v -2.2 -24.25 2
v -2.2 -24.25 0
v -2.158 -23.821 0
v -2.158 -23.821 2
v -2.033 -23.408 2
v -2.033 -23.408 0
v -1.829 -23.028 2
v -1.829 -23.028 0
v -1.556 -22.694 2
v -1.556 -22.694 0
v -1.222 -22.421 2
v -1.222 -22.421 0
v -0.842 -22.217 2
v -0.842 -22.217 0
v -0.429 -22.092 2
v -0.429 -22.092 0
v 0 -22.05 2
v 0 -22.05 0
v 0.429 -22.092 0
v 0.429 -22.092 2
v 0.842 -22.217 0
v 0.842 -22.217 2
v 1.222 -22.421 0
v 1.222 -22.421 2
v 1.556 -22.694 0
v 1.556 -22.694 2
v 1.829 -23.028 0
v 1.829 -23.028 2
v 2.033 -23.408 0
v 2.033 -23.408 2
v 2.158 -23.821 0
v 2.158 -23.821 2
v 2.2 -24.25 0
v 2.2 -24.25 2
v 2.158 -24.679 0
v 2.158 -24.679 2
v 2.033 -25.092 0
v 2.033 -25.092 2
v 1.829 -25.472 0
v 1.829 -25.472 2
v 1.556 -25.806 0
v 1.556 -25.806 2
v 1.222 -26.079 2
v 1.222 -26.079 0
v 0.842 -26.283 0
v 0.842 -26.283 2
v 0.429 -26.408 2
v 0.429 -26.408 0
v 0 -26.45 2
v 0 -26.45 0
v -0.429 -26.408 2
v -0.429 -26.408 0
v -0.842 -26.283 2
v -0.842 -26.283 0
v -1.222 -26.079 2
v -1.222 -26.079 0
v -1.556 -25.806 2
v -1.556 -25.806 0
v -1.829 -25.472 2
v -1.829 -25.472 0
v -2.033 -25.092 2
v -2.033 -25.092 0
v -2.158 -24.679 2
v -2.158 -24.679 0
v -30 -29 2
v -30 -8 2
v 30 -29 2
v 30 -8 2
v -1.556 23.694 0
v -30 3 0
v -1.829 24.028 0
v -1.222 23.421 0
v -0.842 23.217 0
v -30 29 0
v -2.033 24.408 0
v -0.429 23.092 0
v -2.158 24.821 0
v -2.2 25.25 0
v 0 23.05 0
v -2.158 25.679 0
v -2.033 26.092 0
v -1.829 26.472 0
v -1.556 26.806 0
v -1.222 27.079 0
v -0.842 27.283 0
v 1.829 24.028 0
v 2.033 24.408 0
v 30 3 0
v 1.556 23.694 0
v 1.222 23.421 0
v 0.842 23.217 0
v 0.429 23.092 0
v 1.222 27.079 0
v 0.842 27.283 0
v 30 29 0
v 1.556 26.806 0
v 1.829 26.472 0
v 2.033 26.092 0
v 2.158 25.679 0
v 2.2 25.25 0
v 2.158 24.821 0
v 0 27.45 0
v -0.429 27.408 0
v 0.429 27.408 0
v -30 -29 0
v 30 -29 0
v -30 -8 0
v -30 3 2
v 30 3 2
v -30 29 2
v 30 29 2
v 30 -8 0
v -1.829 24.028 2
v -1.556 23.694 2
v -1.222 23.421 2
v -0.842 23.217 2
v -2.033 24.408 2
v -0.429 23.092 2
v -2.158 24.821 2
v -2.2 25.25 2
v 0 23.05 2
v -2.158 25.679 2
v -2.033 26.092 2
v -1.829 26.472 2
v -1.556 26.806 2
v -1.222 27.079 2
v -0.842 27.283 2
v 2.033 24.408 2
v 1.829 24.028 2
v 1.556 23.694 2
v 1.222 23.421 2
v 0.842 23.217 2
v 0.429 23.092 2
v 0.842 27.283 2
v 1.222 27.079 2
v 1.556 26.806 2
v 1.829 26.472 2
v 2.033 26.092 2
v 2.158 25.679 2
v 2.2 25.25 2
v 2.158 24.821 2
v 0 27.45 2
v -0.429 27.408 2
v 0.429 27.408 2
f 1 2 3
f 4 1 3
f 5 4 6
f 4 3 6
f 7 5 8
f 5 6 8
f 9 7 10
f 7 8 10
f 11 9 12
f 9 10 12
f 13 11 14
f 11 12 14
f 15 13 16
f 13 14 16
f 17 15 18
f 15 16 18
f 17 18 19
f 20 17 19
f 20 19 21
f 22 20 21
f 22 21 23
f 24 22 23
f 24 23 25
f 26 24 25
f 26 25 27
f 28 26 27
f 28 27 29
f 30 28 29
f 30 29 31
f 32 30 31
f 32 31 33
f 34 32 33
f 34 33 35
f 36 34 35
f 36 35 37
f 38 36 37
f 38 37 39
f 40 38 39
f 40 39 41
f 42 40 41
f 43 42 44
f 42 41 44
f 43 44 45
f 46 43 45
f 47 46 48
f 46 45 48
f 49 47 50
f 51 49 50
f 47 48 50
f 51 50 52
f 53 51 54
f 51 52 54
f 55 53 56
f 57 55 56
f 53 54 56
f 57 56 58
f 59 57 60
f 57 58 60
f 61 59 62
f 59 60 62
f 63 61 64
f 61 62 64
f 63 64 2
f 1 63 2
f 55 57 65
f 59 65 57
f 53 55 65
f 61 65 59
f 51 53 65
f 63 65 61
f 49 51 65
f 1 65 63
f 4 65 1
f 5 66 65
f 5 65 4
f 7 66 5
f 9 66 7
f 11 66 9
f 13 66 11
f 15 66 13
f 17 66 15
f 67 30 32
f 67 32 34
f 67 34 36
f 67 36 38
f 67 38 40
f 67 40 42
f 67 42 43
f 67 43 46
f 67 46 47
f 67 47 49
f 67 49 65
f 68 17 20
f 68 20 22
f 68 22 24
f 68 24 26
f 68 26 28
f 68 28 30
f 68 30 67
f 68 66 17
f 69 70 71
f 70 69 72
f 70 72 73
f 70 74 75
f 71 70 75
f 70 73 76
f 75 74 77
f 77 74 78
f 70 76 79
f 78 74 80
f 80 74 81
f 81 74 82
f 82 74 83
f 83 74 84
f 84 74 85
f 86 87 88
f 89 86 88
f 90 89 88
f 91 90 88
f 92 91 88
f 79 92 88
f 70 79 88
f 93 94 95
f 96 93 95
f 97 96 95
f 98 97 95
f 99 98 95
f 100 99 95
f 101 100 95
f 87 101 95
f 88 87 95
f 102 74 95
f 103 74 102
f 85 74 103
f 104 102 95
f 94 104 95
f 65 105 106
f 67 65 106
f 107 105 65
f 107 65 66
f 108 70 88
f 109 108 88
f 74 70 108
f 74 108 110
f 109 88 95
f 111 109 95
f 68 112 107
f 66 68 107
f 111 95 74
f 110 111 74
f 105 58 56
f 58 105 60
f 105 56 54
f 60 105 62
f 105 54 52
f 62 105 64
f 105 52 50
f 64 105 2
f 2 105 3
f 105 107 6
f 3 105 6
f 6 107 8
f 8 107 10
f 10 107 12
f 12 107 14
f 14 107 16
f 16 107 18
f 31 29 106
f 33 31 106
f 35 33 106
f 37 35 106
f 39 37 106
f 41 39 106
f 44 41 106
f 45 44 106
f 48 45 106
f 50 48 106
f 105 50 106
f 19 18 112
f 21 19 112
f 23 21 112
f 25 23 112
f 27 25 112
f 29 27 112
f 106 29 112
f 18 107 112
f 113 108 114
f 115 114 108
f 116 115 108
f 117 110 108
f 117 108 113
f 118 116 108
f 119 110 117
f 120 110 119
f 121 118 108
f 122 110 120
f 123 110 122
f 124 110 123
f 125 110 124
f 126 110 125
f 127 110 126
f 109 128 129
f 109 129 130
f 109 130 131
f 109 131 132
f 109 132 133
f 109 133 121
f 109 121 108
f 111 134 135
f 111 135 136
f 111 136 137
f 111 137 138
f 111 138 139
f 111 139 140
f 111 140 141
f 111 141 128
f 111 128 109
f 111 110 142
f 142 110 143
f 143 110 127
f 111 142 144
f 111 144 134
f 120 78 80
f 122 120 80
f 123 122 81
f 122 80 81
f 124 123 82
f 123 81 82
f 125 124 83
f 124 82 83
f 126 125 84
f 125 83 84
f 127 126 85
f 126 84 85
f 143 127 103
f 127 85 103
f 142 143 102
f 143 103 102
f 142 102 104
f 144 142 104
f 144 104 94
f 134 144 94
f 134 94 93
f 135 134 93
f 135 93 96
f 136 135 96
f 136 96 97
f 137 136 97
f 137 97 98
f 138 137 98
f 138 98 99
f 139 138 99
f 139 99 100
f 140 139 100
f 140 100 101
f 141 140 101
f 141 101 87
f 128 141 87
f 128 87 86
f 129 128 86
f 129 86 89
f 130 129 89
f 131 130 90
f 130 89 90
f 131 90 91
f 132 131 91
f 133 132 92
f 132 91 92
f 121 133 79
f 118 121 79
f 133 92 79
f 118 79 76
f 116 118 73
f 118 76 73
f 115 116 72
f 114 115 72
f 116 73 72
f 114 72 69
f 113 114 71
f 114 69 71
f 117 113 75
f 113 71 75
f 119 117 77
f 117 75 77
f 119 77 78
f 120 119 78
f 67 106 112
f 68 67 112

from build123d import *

# Parameters (mm, degrees)
F0_W             = 13.2466710359
F0_H             = 26
F0_W_2           = 16.7533289641
F0_W_3           = 30
F1_DEPTH         = 2
F0_W_4           = 13.0084685236
F0_H_2           = 21
F3_D             = 4.4
F3_CBORE_D       = 8.25
F3_CBORE_DEPTH   = 0
F3_2_D           = 4.4
F3_2_CBORE_D     = 8.25
F3_2_CBORE_DEPTH = 0


with BuildPart() as f1:
    # F0 (on Top) → F1 (new body)
    with BuildSketch(Plane.XY):
        with Locations((-23.3766644821, 16)):
            Rectangle(F0_W, F0_H)
        with Locations((-8.3766644821, 16)):
            Rectangle(F0_W_2, F0_H)
        with Locations((15, 16)):
            Rectangle(F0_W_3, F0_H)
    extrude(amount=F1_DEPTH)

    # F3 (through all)
    with Locations(Plane.XY.offset(2)):
        with Locations((0, 25.25), (0, -24.25)):
            CounterBoreHole(F3_D / 2, F3_CBORE_D / 2, F3_CBORE_DEPTH)


with BuildPart() as f1b:
    # F0 (on Top) → F1, piece 2 (new body)
    with BuildSketch(Plane.XY):
        Polygon((30, -8), (0, -8), (0, -20.5), (0, -29), (30, -29), align=None)
        with Locations((-23.4957657382, -18.5)):
            Rectangle(F0_W_4, F0_H_2)
        Polygon((0, -8), (-16.9915314764, -8), (-16.9915314764, -29), (0, -29), (0, -20.5), align=None)
    extrude(amount=F1_DEPTH)

    # F3#2 (through all)
    with Locations(Plane.XY.offset(2)):
        with Locations((0, 25.25), (0, -24.25)):
            CounterBoreHole(F3_2_D / 2, F3_2_CBORE_D / 2, F3_2_CBORE_DEPTH)


solid = Compound([f1.part, f1b.part])
